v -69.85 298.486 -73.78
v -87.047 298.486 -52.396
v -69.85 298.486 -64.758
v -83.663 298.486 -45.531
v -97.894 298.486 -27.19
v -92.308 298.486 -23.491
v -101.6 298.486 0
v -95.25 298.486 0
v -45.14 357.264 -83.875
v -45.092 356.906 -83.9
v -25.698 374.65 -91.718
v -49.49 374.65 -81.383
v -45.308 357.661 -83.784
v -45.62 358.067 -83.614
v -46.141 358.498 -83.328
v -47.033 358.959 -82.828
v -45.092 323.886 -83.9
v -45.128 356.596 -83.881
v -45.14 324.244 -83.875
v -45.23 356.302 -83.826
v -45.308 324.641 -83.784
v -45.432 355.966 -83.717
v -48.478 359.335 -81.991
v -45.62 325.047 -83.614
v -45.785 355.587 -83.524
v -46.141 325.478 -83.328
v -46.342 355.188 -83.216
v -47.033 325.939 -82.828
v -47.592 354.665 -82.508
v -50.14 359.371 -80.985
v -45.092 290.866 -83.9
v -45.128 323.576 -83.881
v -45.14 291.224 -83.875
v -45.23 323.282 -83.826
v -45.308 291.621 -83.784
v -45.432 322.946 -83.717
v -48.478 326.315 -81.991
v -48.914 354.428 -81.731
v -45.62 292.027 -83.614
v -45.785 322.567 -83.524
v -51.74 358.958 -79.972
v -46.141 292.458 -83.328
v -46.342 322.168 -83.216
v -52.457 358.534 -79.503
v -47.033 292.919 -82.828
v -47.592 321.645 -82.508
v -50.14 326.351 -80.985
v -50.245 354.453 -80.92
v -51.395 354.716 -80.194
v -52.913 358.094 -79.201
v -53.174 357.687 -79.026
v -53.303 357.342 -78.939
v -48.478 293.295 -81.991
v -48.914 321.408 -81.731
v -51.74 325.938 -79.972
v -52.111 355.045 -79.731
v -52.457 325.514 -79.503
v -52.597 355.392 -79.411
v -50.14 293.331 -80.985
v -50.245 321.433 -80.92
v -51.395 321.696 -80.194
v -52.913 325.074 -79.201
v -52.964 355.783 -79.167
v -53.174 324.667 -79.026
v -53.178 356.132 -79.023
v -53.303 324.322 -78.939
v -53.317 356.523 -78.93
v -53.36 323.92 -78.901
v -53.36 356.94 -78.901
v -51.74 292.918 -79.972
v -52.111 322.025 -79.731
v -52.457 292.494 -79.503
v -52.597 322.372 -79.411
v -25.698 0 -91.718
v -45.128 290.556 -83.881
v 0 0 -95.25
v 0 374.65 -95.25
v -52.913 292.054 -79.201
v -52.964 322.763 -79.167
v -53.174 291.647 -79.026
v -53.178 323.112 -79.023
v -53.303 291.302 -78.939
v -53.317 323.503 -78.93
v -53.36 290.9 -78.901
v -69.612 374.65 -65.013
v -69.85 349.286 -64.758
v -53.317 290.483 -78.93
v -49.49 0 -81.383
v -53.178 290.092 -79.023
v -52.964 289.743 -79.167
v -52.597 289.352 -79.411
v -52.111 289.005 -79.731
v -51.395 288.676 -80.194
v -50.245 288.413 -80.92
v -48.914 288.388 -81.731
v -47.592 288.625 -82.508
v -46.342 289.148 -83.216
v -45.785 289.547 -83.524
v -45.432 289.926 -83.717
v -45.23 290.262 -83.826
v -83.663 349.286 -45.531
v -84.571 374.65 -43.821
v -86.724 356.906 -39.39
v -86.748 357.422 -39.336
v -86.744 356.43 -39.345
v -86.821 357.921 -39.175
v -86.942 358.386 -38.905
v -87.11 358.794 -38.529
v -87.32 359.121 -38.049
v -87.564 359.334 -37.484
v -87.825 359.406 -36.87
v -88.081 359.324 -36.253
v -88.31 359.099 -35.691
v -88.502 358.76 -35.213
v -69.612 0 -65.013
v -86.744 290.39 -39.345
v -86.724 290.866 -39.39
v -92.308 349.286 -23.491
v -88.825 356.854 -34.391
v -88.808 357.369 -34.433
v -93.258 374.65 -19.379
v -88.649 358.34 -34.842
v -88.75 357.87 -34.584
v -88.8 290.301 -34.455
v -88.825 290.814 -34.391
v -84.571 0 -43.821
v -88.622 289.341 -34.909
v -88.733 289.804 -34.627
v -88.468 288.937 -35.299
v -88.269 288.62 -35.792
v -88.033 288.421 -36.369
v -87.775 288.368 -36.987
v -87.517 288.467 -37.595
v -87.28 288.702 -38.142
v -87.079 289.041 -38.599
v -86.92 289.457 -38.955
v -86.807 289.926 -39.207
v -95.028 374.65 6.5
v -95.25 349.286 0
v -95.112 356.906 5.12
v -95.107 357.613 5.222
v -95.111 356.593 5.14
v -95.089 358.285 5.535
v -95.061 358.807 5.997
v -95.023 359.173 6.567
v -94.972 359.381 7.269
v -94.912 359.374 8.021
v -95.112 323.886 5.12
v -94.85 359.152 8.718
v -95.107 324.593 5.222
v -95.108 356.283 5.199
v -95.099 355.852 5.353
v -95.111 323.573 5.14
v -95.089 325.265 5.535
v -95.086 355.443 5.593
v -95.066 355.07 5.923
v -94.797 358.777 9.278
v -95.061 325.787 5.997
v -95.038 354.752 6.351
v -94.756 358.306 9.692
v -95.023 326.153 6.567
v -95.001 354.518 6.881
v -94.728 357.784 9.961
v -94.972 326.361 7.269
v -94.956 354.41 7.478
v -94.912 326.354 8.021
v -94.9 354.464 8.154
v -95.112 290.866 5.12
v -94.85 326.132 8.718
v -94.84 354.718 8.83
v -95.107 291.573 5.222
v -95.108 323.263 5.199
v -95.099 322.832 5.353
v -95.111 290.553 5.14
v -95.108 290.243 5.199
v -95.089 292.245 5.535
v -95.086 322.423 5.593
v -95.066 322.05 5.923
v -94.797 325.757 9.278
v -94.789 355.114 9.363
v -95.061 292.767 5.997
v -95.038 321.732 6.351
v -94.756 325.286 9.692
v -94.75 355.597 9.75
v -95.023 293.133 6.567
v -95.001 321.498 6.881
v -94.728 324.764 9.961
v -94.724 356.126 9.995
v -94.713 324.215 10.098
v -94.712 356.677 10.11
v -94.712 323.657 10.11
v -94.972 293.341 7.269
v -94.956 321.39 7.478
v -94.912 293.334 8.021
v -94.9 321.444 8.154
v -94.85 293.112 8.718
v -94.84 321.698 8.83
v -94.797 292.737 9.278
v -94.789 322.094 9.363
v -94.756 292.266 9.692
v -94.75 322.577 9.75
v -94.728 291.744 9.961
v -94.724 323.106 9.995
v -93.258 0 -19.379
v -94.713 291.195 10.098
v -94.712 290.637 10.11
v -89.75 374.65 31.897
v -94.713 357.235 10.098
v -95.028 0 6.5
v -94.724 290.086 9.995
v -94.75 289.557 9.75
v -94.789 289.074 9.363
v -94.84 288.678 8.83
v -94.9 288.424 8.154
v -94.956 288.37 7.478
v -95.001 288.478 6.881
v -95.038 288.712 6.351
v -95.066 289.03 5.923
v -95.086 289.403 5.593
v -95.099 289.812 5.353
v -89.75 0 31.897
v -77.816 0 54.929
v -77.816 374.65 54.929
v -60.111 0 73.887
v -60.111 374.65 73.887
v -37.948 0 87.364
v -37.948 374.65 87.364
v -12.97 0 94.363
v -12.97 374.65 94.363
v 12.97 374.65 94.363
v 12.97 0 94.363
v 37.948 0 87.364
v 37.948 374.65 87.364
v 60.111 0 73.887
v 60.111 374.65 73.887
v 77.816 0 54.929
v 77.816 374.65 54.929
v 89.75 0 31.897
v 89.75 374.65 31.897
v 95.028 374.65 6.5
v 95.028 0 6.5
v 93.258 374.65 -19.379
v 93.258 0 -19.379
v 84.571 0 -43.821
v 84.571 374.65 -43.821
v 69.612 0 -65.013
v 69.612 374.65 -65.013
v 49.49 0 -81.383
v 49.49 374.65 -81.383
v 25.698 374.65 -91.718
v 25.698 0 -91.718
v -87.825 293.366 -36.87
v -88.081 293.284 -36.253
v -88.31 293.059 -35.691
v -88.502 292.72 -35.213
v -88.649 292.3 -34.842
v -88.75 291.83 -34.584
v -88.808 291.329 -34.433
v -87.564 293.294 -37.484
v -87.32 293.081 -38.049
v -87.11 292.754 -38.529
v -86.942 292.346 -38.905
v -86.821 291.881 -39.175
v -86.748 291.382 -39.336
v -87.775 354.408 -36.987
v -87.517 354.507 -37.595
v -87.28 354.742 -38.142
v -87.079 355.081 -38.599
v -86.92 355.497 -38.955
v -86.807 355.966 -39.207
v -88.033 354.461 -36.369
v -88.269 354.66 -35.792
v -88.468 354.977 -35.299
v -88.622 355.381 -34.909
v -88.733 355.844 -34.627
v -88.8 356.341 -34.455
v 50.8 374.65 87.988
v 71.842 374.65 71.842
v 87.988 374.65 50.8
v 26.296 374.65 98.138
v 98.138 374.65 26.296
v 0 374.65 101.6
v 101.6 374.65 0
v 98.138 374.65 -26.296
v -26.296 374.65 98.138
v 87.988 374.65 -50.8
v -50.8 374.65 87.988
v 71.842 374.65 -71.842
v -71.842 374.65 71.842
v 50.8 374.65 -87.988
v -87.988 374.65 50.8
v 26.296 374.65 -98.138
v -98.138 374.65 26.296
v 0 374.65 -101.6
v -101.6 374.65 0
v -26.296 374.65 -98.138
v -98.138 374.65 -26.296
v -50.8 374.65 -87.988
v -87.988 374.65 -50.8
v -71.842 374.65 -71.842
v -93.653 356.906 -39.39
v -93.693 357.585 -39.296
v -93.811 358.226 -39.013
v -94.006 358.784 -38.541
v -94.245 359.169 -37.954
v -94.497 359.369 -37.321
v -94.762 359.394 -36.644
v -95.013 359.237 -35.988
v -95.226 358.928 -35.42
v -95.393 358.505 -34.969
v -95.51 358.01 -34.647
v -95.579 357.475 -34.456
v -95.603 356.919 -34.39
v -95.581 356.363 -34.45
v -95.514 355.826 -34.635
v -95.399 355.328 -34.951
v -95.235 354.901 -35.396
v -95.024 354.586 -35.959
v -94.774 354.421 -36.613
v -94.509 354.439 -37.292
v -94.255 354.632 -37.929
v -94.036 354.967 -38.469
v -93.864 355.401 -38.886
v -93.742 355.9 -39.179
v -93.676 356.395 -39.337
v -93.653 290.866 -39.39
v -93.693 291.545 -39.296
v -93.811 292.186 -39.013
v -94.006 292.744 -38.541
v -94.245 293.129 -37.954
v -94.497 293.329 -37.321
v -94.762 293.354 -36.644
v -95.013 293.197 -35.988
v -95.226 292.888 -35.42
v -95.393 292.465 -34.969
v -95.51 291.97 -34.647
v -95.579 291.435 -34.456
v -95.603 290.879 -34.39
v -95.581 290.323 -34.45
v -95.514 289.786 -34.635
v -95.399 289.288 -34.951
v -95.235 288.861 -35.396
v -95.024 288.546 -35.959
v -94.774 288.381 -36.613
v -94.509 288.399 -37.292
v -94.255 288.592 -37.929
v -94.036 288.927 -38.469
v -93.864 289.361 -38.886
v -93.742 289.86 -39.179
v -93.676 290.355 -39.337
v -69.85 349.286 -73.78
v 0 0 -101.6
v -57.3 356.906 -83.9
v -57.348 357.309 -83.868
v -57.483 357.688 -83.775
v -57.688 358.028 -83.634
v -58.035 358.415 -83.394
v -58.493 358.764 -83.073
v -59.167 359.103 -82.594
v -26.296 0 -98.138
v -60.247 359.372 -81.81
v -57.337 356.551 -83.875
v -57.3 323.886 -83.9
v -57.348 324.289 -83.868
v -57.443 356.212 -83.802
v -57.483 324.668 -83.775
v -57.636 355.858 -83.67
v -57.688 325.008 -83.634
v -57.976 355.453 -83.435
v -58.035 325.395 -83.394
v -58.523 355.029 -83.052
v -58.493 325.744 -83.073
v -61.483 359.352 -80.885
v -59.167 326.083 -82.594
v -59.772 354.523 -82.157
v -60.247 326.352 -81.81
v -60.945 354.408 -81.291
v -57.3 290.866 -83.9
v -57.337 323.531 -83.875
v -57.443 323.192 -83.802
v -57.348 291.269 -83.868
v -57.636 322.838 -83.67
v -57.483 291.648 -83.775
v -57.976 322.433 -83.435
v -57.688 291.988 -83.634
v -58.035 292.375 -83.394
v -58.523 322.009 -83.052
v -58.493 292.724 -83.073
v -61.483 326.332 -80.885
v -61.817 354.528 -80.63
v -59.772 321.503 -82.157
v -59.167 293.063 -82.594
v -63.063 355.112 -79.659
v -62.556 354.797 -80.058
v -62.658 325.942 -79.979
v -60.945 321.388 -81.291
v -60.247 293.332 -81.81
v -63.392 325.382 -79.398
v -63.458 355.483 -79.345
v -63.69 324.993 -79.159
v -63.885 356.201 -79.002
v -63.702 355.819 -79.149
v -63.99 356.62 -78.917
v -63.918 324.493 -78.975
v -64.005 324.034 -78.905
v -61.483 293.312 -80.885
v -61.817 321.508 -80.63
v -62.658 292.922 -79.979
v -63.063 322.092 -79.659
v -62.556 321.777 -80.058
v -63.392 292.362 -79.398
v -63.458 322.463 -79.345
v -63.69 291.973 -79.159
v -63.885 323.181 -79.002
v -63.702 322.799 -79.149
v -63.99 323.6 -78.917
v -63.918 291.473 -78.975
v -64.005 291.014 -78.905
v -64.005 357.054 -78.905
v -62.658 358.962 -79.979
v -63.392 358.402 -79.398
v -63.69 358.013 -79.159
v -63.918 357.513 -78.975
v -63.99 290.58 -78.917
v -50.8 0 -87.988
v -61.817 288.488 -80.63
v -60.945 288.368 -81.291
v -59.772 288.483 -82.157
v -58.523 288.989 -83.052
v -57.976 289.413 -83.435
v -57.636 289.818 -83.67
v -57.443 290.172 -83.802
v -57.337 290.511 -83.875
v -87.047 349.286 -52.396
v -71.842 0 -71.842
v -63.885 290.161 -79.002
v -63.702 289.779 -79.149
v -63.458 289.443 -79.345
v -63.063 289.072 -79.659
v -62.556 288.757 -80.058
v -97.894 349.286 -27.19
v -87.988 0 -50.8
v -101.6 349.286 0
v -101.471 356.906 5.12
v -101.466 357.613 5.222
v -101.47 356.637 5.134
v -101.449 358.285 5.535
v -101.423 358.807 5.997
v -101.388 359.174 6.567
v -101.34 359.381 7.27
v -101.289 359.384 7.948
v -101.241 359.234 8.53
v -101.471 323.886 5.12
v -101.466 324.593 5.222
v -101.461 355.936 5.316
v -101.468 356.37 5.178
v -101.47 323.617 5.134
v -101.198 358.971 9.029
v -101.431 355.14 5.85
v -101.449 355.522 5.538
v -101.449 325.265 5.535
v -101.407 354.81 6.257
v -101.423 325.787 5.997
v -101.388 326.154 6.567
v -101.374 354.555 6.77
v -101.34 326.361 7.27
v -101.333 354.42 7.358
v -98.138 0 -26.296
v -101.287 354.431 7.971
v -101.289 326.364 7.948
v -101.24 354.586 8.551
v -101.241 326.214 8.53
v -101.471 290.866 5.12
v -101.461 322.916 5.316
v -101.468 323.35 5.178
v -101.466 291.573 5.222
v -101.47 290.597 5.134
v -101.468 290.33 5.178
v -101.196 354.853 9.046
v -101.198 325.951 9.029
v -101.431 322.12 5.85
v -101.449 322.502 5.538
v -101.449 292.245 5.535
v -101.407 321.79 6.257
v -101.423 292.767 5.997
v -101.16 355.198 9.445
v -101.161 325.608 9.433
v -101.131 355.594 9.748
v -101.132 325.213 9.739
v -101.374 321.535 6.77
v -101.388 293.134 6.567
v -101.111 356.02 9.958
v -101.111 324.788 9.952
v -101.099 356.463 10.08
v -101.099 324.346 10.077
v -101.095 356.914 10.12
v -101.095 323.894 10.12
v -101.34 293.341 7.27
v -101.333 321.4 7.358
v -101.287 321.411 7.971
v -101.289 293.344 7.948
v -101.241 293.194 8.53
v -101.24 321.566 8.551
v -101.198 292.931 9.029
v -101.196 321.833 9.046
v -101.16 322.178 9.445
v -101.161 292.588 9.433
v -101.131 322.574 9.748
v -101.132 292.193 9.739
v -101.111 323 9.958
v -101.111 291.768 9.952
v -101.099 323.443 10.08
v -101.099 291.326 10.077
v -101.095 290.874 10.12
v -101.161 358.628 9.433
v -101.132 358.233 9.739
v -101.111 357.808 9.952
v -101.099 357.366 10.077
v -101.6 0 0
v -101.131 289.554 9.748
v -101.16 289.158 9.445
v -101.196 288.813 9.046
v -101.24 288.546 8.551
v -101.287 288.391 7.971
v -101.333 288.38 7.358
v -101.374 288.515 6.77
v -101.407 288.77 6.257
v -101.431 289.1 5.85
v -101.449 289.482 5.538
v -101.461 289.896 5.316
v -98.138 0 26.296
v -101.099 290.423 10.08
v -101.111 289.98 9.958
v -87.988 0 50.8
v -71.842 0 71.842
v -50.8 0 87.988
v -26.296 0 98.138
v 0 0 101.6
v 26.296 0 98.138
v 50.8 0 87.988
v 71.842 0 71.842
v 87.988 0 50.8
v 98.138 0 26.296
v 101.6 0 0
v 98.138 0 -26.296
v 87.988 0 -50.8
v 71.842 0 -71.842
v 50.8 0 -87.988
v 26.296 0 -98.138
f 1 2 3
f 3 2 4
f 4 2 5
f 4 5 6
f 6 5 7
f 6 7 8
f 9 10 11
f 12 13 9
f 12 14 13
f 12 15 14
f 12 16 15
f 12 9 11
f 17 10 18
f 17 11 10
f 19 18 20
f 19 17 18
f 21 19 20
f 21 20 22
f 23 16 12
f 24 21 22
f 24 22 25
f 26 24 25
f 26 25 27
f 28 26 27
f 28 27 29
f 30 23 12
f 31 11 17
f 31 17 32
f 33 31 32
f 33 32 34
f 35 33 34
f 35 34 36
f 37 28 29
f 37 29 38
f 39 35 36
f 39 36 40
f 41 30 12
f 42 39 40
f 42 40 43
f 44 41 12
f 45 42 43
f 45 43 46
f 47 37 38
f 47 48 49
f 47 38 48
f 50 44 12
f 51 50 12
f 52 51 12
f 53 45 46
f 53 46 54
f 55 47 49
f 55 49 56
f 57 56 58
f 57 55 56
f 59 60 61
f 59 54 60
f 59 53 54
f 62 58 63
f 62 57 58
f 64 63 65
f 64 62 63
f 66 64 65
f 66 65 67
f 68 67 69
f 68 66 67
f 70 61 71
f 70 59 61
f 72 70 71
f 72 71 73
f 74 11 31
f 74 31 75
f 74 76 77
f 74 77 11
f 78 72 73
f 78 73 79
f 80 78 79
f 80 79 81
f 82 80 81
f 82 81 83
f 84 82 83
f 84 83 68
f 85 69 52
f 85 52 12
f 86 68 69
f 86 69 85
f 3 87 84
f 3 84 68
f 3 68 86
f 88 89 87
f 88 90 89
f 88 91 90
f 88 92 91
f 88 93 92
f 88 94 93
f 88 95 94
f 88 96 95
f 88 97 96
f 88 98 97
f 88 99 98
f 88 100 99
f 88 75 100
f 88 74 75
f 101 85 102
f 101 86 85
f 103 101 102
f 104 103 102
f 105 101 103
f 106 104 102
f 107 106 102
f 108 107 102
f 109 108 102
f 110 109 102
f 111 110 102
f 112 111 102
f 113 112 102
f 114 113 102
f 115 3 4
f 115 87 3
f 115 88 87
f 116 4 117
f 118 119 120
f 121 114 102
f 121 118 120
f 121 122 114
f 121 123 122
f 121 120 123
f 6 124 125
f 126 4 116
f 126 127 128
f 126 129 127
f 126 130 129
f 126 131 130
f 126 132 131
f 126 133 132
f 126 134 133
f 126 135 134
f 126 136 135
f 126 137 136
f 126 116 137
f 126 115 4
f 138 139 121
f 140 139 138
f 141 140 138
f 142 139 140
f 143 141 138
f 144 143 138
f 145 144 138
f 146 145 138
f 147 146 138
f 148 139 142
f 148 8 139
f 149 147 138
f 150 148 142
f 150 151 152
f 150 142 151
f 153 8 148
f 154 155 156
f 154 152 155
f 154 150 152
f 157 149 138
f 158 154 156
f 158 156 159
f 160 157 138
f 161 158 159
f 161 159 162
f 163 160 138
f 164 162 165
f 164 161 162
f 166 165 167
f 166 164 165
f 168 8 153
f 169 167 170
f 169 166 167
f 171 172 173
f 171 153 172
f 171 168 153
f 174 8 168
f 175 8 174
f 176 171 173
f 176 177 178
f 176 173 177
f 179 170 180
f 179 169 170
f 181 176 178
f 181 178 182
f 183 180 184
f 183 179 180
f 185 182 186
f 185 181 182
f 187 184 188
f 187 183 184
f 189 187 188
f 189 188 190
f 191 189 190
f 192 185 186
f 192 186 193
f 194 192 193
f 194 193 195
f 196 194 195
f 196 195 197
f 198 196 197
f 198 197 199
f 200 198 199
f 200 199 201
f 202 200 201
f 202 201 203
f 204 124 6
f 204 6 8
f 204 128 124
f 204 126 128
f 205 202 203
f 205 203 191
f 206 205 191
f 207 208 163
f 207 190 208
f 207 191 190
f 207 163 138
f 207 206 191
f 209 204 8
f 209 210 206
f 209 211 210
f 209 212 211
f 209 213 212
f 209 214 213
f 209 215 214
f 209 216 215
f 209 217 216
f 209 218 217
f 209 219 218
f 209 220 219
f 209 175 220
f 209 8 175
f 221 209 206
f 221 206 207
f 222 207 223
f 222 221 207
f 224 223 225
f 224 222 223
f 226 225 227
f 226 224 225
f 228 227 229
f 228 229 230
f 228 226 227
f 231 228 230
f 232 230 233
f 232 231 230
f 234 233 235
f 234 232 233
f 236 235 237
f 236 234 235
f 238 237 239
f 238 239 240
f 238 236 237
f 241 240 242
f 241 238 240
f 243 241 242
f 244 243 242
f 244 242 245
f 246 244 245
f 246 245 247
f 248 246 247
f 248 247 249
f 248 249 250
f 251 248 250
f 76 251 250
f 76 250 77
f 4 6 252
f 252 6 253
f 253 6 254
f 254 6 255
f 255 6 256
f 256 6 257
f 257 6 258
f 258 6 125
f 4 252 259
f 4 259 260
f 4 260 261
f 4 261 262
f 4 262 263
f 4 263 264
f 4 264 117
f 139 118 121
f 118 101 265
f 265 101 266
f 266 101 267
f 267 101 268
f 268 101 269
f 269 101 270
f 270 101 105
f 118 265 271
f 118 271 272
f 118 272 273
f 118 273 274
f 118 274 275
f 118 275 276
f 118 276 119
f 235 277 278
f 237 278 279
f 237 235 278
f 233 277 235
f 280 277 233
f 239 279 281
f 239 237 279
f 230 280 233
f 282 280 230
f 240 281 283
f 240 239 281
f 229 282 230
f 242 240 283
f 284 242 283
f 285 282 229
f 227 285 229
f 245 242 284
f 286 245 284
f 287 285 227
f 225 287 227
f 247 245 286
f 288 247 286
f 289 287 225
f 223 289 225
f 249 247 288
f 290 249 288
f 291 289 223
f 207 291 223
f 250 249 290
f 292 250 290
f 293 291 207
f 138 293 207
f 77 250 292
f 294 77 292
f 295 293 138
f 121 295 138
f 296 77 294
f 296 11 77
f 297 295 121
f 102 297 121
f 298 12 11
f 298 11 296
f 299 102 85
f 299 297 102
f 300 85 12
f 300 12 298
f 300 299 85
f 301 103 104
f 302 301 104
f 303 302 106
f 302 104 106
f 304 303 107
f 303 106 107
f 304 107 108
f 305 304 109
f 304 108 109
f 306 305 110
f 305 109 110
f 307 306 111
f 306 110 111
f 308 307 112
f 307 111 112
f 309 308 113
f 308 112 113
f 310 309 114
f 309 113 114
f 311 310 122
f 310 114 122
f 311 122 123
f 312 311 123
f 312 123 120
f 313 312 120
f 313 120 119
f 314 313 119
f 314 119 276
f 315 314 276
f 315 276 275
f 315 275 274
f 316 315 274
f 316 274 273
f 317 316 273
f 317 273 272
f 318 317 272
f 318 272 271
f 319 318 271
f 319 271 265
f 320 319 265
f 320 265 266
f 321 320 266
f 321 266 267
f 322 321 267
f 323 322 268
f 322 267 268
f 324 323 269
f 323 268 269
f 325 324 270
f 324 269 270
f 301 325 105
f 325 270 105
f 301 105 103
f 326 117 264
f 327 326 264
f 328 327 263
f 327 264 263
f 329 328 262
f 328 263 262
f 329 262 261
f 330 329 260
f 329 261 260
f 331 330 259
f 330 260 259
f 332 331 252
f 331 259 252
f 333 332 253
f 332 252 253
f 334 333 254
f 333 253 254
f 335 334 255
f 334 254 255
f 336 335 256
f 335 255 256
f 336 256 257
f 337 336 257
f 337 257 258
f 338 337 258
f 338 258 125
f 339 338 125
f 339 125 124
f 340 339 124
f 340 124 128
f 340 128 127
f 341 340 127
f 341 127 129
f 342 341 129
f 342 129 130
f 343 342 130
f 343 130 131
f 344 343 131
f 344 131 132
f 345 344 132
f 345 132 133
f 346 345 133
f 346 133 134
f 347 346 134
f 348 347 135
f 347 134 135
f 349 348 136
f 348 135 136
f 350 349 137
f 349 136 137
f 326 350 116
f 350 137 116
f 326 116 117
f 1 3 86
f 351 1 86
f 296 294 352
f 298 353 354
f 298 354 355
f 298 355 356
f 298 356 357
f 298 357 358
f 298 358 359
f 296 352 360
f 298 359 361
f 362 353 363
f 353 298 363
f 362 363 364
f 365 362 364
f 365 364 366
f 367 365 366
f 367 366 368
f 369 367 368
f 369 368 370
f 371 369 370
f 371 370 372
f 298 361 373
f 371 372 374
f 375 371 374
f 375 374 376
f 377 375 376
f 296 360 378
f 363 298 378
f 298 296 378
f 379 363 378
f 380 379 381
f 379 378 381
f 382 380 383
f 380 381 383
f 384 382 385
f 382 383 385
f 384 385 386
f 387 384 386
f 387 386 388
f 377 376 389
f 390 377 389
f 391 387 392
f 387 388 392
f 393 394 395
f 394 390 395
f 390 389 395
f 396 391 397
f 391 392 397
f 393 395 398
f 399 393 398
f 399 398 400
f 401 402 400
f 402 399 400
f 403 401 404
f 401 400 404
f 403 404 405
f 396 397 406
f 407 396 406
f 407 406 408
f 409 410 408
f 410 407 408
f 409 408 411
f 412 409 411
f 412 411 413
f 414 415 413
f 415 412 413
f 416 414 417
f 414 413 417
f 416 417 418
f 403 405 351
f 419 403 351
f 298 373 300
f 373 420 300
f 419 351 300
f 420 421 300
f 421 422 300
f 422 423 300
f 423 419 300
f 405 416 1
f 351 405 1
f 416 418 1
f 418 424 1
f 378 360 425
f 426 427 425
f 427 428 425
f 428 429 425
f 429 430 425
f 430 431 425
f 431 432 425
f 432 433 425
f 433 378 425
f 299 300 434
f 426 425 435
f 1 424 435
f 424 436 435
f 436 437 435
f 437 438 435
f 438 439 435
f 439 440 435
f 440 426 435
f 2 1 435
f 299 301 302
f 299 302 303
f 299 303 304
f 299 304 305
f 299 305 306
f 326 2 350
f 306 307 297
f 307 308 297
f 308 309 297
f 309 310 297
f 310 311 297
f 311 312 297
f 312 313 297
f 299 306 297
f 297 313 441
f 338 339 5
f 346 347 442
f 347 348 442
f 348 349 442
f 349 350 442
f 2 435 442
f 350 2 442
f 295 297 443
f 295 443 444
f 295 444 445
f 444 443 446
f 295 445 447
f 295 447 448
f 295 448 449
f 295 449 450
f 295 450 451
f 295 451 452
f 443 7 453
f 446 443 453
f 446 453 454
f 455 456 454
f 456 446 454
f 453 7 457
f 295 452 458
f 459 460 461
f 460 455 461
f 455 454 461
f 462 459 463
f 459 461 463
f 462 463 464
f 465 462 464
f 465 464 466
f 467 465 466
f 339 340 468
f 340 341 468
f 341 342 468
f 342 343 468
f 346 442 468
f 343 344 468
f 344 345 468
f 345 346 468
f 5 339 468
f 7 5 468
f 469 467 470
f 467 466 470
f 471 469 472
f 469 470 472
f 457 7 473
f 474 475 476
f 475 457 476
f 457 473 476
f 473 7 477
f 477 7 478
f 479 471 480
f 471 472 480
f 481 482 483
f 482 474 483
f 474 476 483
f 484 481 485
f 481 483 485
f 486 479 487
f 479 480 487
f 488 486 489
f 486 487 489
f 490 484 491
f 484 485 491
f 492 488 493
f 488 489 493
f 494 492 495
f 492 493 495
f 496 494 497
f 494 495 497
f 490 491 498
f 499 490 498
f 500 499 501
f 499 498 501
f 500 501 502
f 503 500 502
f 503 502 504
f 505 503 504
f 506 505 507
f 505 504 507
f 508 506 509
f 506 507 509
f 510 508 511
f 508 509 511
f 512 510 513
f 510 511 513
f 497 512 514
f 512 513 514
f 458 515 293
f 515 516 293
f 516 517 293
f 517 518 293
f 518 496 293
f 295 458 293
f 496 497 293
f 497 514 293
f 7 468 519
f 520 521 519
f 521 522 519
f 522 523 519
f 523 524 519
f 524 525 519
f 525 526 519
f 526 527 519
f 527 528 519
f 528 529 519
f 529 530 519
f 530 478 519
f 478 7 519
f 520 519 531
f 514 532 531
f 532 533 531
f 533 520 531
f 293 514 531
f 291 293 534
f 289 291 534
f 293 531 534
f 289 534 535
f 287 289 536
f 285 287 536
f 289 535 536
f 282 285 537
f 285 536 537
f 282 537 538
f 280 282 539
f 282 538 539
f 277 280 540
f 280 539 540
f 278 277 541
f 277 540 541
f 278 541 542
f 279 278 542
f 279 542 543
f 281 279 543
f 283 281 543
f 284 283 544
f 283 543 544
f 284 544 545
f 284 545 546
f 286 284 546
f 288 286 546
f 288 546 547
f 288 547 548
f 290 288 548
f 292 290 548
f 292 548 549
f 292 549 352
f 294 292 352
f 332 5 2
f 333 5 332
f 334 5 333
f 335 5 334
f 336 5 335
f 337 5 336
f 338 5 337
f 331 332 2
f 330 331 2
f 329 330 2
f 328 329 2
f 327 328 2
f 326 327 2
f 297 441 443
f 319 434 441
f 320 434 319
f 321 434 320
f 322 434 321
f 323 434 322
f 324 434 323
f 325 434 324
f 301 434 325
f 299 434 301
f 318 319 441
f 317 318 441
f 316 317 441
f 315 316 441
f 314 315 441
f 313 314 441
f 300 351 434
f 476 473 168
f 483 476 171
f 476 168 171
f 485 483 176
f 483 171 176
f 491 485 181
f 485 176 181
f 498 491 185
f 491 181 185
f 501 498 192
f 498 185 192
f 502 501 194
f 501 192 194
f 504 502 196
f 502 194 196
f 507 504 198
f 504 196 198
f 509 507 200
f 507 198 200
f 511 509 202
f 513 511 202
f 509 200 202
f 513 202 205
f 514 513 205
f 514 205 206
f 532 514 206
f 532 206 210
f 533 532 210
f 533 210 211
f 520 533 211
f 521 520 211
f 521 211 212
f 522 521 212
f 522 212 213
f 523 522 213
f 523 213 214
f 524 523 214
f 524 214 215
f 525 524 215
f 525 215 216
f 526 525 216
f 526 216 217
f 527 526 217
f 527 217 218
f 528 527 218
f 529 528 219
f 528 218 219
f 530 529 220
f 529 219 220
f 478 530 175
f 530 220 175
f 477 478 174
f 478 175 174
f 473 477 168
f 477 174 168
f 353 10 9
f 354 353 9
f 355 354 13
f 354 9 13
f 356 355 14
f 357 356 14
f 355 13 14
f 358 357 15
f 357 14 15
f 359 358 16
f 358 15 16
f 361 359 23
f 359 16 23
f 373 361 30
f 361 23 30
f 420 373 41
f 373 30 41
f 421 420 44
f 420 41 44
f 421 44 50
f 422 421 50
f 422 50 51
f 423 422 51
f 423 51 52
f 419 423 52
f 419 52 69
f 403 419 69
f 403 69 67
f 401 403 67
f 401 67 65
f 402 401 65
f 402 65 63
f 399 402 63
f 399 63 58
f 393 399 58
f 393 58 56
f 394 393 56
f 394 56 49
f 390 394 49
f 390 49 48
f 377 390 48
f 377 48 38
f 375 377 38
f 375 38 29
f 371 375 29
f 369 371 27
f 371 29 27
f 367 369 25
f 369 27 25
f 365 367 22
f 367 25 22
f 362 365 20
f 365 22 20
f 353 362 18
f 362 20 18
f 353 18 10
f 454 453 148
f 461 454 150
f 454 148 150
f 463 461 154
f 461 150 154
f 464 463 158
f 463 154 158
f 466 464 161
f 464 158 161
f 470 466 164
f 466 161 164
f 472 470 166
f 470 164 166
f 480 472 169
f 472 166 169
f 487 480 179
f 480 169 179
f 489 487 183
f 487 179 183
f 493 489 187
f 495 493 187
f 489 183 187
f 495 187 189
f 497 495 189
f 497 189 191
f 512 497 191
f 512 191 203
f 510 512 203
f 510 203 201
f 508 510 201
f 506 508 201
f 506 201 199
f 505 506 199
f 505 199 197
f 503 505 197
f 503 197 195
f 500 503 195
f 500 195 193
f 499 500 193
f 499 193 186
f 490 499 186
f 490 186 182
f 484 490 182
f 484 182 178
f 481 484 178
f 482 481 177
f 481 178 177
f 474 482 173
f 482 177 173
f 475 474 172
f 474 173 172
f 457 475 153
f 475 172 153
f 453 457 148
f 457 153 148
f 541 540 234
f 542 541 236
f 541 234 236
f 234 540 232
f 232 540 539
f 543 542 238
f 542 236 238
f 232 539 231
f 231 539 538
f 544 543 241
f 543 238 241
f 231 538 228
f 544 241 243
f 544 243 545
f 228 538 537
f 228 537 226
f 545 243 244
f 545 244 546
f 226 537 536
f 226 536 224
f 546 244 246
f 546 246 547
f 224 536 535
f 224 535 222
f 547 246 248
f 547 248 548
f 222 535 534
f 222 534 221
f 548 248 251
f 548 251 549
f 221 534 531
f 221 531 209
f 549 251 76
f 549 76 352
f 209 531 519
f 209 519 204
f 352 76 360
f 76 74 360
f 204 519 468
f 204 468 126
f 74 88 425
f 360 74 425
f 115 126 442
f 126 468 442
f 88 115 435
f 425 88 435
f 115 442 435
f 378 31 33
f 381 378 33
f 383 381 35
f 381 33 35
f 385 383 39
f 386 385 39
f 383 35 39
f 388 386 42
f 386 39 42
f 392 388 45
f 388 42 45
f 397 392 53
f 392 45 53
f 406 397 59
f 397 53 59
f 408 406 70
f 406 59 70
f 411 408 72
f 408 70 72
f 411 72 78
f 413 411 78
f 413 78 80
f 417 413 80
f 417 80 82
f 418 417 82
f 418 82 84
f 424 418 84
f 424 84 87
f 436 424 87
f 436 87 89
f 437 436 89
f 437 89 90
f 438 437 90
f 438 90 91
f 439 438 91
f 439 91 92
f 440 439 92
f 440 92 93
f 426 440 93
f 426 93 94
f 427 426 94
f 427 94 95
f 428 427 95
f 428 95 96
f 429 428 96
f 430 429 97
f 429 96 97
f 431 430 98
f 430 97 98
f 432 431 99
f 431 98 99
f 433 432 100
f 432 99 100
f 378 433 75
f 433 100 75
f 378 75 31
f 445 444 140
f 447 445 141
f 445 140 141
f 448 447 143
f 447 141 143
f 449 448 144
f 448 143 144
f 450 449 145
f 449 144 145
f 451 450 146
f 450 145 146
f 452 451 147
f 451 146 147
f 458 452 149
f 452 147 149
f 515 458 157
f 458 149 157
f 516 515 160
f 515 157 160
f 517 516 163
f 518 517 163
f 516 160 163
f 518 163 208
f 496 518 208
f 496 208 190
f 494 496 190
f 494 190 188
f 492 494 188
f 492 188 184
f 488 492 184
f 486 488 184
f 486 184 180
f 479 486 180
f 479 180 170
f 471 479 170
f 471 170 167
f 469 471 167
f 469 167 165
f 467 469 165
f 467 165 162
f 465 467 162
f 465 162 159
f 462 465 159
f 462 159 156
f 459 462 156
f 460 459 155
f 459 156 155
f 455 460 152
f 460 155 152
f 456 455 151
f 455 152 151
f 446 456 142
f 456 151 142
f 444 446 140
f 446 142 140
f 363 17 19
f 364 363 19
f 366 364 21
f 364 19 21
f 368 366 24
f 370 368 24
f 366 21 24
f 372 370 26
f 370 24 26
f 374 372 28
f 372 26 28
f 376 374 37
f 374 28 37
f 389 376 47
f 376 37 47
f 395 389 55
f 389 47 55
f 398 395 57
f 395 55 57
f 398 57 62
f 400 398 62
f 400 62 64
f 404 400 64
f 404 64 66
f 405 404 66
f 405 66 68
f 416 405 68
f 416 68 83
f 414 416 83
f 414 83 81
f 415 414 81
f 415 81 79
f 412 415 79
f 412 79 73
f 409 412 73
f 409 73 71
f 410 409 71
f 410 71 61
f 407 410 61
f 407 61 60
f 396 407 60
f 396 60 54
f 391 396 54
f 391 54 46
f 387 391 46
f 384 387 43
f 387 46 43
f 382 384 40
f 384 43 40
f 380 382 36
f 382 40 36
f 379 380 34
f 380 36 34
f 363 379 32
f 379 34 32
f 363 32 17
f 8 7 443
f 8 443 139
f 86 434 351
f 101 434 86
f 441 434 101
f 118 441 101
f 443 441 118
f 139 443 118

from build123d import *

# Parameters (mm, degrees)
SKETCH2_R           = 101.6
SKETCH2_R_2         = 95.25
BOSS_EXTRUDE1_DEPTH = 374.65
SKETCH3_W           = 31.75
SKETCH3_H           = 50.8
CUT_EXTRUDE2_DEPTH  = 402.257700861
SKETCH4_R           = 2.5
CUT_EXTRUDE3_DEPTH  = 402.257700861


with BuildPart() as part:
    # Sketch2 → Boss-Extrude1 (new body)
    with BuildSketch(Plane(origin=(0, 0, 0), x_dir=(1, 0, 0), z_dir=(0, 1, 0))):
        with Locations(Location((0, 0, 0), (0, 0, 90))):
            Circle(SKETCH2_R)
        with Locations(Location((0, 0, 0), (0, 0, 90))):
            Circle(SKETCH2_R_2, mode=Mode.SUBTRACT)
    extrude(amount=BOSS_EXTRUDE1_DEPTH)

    # Sketch3 → Cut-Extrude2 (cut, through all)
    with BuildSketch(Plane.XY):
        with Locations((-85.725, 323.886005252)):
            Rectangle(SKETCH3_W, SKETCH3_H)
    extrude(amount=-CUT_EXTRUDE2_DEPTH, mode=Mode.SUBTRACT)

    # Sketch4 → Cut-Extrude3 (cut, through all)
    with BuildSketch(Plane(origin=(0, 0, 0), x_dir=(0, 0, -1), z_dir=(1, 0, 0))):
        with Locations((81.400332745, 356.906005252)):
            Circle(SKETCH4_R)
        with Locations((36.890166373, 356.906005252)):
            Circle(SKETCH4_R)
        with Locations((-7.62, 356.906005252)):
            Circle(SKETCH4_R)
        with Locations((-7.62, 323.886005252)):
            Circle(SKETCH4_R)
        with Locations((-7.62, 290.866005252)):
            Circle(SKETCH4_R)
        with Locations((36.890166373, 290.866005252)):
            Circle(SKETCH4_R)
        with Locations((81.400332745, 290.866005252)):
            Circle(SKETCH4_R)
        with Locations((81.400332745, 323.886005252)):
            Circle(SKETCH4_R)
    extrude(amount=-CUT_EXTRUDE3_DEPTH, mode=Mode.SUBTRACT)


solid = part.part
